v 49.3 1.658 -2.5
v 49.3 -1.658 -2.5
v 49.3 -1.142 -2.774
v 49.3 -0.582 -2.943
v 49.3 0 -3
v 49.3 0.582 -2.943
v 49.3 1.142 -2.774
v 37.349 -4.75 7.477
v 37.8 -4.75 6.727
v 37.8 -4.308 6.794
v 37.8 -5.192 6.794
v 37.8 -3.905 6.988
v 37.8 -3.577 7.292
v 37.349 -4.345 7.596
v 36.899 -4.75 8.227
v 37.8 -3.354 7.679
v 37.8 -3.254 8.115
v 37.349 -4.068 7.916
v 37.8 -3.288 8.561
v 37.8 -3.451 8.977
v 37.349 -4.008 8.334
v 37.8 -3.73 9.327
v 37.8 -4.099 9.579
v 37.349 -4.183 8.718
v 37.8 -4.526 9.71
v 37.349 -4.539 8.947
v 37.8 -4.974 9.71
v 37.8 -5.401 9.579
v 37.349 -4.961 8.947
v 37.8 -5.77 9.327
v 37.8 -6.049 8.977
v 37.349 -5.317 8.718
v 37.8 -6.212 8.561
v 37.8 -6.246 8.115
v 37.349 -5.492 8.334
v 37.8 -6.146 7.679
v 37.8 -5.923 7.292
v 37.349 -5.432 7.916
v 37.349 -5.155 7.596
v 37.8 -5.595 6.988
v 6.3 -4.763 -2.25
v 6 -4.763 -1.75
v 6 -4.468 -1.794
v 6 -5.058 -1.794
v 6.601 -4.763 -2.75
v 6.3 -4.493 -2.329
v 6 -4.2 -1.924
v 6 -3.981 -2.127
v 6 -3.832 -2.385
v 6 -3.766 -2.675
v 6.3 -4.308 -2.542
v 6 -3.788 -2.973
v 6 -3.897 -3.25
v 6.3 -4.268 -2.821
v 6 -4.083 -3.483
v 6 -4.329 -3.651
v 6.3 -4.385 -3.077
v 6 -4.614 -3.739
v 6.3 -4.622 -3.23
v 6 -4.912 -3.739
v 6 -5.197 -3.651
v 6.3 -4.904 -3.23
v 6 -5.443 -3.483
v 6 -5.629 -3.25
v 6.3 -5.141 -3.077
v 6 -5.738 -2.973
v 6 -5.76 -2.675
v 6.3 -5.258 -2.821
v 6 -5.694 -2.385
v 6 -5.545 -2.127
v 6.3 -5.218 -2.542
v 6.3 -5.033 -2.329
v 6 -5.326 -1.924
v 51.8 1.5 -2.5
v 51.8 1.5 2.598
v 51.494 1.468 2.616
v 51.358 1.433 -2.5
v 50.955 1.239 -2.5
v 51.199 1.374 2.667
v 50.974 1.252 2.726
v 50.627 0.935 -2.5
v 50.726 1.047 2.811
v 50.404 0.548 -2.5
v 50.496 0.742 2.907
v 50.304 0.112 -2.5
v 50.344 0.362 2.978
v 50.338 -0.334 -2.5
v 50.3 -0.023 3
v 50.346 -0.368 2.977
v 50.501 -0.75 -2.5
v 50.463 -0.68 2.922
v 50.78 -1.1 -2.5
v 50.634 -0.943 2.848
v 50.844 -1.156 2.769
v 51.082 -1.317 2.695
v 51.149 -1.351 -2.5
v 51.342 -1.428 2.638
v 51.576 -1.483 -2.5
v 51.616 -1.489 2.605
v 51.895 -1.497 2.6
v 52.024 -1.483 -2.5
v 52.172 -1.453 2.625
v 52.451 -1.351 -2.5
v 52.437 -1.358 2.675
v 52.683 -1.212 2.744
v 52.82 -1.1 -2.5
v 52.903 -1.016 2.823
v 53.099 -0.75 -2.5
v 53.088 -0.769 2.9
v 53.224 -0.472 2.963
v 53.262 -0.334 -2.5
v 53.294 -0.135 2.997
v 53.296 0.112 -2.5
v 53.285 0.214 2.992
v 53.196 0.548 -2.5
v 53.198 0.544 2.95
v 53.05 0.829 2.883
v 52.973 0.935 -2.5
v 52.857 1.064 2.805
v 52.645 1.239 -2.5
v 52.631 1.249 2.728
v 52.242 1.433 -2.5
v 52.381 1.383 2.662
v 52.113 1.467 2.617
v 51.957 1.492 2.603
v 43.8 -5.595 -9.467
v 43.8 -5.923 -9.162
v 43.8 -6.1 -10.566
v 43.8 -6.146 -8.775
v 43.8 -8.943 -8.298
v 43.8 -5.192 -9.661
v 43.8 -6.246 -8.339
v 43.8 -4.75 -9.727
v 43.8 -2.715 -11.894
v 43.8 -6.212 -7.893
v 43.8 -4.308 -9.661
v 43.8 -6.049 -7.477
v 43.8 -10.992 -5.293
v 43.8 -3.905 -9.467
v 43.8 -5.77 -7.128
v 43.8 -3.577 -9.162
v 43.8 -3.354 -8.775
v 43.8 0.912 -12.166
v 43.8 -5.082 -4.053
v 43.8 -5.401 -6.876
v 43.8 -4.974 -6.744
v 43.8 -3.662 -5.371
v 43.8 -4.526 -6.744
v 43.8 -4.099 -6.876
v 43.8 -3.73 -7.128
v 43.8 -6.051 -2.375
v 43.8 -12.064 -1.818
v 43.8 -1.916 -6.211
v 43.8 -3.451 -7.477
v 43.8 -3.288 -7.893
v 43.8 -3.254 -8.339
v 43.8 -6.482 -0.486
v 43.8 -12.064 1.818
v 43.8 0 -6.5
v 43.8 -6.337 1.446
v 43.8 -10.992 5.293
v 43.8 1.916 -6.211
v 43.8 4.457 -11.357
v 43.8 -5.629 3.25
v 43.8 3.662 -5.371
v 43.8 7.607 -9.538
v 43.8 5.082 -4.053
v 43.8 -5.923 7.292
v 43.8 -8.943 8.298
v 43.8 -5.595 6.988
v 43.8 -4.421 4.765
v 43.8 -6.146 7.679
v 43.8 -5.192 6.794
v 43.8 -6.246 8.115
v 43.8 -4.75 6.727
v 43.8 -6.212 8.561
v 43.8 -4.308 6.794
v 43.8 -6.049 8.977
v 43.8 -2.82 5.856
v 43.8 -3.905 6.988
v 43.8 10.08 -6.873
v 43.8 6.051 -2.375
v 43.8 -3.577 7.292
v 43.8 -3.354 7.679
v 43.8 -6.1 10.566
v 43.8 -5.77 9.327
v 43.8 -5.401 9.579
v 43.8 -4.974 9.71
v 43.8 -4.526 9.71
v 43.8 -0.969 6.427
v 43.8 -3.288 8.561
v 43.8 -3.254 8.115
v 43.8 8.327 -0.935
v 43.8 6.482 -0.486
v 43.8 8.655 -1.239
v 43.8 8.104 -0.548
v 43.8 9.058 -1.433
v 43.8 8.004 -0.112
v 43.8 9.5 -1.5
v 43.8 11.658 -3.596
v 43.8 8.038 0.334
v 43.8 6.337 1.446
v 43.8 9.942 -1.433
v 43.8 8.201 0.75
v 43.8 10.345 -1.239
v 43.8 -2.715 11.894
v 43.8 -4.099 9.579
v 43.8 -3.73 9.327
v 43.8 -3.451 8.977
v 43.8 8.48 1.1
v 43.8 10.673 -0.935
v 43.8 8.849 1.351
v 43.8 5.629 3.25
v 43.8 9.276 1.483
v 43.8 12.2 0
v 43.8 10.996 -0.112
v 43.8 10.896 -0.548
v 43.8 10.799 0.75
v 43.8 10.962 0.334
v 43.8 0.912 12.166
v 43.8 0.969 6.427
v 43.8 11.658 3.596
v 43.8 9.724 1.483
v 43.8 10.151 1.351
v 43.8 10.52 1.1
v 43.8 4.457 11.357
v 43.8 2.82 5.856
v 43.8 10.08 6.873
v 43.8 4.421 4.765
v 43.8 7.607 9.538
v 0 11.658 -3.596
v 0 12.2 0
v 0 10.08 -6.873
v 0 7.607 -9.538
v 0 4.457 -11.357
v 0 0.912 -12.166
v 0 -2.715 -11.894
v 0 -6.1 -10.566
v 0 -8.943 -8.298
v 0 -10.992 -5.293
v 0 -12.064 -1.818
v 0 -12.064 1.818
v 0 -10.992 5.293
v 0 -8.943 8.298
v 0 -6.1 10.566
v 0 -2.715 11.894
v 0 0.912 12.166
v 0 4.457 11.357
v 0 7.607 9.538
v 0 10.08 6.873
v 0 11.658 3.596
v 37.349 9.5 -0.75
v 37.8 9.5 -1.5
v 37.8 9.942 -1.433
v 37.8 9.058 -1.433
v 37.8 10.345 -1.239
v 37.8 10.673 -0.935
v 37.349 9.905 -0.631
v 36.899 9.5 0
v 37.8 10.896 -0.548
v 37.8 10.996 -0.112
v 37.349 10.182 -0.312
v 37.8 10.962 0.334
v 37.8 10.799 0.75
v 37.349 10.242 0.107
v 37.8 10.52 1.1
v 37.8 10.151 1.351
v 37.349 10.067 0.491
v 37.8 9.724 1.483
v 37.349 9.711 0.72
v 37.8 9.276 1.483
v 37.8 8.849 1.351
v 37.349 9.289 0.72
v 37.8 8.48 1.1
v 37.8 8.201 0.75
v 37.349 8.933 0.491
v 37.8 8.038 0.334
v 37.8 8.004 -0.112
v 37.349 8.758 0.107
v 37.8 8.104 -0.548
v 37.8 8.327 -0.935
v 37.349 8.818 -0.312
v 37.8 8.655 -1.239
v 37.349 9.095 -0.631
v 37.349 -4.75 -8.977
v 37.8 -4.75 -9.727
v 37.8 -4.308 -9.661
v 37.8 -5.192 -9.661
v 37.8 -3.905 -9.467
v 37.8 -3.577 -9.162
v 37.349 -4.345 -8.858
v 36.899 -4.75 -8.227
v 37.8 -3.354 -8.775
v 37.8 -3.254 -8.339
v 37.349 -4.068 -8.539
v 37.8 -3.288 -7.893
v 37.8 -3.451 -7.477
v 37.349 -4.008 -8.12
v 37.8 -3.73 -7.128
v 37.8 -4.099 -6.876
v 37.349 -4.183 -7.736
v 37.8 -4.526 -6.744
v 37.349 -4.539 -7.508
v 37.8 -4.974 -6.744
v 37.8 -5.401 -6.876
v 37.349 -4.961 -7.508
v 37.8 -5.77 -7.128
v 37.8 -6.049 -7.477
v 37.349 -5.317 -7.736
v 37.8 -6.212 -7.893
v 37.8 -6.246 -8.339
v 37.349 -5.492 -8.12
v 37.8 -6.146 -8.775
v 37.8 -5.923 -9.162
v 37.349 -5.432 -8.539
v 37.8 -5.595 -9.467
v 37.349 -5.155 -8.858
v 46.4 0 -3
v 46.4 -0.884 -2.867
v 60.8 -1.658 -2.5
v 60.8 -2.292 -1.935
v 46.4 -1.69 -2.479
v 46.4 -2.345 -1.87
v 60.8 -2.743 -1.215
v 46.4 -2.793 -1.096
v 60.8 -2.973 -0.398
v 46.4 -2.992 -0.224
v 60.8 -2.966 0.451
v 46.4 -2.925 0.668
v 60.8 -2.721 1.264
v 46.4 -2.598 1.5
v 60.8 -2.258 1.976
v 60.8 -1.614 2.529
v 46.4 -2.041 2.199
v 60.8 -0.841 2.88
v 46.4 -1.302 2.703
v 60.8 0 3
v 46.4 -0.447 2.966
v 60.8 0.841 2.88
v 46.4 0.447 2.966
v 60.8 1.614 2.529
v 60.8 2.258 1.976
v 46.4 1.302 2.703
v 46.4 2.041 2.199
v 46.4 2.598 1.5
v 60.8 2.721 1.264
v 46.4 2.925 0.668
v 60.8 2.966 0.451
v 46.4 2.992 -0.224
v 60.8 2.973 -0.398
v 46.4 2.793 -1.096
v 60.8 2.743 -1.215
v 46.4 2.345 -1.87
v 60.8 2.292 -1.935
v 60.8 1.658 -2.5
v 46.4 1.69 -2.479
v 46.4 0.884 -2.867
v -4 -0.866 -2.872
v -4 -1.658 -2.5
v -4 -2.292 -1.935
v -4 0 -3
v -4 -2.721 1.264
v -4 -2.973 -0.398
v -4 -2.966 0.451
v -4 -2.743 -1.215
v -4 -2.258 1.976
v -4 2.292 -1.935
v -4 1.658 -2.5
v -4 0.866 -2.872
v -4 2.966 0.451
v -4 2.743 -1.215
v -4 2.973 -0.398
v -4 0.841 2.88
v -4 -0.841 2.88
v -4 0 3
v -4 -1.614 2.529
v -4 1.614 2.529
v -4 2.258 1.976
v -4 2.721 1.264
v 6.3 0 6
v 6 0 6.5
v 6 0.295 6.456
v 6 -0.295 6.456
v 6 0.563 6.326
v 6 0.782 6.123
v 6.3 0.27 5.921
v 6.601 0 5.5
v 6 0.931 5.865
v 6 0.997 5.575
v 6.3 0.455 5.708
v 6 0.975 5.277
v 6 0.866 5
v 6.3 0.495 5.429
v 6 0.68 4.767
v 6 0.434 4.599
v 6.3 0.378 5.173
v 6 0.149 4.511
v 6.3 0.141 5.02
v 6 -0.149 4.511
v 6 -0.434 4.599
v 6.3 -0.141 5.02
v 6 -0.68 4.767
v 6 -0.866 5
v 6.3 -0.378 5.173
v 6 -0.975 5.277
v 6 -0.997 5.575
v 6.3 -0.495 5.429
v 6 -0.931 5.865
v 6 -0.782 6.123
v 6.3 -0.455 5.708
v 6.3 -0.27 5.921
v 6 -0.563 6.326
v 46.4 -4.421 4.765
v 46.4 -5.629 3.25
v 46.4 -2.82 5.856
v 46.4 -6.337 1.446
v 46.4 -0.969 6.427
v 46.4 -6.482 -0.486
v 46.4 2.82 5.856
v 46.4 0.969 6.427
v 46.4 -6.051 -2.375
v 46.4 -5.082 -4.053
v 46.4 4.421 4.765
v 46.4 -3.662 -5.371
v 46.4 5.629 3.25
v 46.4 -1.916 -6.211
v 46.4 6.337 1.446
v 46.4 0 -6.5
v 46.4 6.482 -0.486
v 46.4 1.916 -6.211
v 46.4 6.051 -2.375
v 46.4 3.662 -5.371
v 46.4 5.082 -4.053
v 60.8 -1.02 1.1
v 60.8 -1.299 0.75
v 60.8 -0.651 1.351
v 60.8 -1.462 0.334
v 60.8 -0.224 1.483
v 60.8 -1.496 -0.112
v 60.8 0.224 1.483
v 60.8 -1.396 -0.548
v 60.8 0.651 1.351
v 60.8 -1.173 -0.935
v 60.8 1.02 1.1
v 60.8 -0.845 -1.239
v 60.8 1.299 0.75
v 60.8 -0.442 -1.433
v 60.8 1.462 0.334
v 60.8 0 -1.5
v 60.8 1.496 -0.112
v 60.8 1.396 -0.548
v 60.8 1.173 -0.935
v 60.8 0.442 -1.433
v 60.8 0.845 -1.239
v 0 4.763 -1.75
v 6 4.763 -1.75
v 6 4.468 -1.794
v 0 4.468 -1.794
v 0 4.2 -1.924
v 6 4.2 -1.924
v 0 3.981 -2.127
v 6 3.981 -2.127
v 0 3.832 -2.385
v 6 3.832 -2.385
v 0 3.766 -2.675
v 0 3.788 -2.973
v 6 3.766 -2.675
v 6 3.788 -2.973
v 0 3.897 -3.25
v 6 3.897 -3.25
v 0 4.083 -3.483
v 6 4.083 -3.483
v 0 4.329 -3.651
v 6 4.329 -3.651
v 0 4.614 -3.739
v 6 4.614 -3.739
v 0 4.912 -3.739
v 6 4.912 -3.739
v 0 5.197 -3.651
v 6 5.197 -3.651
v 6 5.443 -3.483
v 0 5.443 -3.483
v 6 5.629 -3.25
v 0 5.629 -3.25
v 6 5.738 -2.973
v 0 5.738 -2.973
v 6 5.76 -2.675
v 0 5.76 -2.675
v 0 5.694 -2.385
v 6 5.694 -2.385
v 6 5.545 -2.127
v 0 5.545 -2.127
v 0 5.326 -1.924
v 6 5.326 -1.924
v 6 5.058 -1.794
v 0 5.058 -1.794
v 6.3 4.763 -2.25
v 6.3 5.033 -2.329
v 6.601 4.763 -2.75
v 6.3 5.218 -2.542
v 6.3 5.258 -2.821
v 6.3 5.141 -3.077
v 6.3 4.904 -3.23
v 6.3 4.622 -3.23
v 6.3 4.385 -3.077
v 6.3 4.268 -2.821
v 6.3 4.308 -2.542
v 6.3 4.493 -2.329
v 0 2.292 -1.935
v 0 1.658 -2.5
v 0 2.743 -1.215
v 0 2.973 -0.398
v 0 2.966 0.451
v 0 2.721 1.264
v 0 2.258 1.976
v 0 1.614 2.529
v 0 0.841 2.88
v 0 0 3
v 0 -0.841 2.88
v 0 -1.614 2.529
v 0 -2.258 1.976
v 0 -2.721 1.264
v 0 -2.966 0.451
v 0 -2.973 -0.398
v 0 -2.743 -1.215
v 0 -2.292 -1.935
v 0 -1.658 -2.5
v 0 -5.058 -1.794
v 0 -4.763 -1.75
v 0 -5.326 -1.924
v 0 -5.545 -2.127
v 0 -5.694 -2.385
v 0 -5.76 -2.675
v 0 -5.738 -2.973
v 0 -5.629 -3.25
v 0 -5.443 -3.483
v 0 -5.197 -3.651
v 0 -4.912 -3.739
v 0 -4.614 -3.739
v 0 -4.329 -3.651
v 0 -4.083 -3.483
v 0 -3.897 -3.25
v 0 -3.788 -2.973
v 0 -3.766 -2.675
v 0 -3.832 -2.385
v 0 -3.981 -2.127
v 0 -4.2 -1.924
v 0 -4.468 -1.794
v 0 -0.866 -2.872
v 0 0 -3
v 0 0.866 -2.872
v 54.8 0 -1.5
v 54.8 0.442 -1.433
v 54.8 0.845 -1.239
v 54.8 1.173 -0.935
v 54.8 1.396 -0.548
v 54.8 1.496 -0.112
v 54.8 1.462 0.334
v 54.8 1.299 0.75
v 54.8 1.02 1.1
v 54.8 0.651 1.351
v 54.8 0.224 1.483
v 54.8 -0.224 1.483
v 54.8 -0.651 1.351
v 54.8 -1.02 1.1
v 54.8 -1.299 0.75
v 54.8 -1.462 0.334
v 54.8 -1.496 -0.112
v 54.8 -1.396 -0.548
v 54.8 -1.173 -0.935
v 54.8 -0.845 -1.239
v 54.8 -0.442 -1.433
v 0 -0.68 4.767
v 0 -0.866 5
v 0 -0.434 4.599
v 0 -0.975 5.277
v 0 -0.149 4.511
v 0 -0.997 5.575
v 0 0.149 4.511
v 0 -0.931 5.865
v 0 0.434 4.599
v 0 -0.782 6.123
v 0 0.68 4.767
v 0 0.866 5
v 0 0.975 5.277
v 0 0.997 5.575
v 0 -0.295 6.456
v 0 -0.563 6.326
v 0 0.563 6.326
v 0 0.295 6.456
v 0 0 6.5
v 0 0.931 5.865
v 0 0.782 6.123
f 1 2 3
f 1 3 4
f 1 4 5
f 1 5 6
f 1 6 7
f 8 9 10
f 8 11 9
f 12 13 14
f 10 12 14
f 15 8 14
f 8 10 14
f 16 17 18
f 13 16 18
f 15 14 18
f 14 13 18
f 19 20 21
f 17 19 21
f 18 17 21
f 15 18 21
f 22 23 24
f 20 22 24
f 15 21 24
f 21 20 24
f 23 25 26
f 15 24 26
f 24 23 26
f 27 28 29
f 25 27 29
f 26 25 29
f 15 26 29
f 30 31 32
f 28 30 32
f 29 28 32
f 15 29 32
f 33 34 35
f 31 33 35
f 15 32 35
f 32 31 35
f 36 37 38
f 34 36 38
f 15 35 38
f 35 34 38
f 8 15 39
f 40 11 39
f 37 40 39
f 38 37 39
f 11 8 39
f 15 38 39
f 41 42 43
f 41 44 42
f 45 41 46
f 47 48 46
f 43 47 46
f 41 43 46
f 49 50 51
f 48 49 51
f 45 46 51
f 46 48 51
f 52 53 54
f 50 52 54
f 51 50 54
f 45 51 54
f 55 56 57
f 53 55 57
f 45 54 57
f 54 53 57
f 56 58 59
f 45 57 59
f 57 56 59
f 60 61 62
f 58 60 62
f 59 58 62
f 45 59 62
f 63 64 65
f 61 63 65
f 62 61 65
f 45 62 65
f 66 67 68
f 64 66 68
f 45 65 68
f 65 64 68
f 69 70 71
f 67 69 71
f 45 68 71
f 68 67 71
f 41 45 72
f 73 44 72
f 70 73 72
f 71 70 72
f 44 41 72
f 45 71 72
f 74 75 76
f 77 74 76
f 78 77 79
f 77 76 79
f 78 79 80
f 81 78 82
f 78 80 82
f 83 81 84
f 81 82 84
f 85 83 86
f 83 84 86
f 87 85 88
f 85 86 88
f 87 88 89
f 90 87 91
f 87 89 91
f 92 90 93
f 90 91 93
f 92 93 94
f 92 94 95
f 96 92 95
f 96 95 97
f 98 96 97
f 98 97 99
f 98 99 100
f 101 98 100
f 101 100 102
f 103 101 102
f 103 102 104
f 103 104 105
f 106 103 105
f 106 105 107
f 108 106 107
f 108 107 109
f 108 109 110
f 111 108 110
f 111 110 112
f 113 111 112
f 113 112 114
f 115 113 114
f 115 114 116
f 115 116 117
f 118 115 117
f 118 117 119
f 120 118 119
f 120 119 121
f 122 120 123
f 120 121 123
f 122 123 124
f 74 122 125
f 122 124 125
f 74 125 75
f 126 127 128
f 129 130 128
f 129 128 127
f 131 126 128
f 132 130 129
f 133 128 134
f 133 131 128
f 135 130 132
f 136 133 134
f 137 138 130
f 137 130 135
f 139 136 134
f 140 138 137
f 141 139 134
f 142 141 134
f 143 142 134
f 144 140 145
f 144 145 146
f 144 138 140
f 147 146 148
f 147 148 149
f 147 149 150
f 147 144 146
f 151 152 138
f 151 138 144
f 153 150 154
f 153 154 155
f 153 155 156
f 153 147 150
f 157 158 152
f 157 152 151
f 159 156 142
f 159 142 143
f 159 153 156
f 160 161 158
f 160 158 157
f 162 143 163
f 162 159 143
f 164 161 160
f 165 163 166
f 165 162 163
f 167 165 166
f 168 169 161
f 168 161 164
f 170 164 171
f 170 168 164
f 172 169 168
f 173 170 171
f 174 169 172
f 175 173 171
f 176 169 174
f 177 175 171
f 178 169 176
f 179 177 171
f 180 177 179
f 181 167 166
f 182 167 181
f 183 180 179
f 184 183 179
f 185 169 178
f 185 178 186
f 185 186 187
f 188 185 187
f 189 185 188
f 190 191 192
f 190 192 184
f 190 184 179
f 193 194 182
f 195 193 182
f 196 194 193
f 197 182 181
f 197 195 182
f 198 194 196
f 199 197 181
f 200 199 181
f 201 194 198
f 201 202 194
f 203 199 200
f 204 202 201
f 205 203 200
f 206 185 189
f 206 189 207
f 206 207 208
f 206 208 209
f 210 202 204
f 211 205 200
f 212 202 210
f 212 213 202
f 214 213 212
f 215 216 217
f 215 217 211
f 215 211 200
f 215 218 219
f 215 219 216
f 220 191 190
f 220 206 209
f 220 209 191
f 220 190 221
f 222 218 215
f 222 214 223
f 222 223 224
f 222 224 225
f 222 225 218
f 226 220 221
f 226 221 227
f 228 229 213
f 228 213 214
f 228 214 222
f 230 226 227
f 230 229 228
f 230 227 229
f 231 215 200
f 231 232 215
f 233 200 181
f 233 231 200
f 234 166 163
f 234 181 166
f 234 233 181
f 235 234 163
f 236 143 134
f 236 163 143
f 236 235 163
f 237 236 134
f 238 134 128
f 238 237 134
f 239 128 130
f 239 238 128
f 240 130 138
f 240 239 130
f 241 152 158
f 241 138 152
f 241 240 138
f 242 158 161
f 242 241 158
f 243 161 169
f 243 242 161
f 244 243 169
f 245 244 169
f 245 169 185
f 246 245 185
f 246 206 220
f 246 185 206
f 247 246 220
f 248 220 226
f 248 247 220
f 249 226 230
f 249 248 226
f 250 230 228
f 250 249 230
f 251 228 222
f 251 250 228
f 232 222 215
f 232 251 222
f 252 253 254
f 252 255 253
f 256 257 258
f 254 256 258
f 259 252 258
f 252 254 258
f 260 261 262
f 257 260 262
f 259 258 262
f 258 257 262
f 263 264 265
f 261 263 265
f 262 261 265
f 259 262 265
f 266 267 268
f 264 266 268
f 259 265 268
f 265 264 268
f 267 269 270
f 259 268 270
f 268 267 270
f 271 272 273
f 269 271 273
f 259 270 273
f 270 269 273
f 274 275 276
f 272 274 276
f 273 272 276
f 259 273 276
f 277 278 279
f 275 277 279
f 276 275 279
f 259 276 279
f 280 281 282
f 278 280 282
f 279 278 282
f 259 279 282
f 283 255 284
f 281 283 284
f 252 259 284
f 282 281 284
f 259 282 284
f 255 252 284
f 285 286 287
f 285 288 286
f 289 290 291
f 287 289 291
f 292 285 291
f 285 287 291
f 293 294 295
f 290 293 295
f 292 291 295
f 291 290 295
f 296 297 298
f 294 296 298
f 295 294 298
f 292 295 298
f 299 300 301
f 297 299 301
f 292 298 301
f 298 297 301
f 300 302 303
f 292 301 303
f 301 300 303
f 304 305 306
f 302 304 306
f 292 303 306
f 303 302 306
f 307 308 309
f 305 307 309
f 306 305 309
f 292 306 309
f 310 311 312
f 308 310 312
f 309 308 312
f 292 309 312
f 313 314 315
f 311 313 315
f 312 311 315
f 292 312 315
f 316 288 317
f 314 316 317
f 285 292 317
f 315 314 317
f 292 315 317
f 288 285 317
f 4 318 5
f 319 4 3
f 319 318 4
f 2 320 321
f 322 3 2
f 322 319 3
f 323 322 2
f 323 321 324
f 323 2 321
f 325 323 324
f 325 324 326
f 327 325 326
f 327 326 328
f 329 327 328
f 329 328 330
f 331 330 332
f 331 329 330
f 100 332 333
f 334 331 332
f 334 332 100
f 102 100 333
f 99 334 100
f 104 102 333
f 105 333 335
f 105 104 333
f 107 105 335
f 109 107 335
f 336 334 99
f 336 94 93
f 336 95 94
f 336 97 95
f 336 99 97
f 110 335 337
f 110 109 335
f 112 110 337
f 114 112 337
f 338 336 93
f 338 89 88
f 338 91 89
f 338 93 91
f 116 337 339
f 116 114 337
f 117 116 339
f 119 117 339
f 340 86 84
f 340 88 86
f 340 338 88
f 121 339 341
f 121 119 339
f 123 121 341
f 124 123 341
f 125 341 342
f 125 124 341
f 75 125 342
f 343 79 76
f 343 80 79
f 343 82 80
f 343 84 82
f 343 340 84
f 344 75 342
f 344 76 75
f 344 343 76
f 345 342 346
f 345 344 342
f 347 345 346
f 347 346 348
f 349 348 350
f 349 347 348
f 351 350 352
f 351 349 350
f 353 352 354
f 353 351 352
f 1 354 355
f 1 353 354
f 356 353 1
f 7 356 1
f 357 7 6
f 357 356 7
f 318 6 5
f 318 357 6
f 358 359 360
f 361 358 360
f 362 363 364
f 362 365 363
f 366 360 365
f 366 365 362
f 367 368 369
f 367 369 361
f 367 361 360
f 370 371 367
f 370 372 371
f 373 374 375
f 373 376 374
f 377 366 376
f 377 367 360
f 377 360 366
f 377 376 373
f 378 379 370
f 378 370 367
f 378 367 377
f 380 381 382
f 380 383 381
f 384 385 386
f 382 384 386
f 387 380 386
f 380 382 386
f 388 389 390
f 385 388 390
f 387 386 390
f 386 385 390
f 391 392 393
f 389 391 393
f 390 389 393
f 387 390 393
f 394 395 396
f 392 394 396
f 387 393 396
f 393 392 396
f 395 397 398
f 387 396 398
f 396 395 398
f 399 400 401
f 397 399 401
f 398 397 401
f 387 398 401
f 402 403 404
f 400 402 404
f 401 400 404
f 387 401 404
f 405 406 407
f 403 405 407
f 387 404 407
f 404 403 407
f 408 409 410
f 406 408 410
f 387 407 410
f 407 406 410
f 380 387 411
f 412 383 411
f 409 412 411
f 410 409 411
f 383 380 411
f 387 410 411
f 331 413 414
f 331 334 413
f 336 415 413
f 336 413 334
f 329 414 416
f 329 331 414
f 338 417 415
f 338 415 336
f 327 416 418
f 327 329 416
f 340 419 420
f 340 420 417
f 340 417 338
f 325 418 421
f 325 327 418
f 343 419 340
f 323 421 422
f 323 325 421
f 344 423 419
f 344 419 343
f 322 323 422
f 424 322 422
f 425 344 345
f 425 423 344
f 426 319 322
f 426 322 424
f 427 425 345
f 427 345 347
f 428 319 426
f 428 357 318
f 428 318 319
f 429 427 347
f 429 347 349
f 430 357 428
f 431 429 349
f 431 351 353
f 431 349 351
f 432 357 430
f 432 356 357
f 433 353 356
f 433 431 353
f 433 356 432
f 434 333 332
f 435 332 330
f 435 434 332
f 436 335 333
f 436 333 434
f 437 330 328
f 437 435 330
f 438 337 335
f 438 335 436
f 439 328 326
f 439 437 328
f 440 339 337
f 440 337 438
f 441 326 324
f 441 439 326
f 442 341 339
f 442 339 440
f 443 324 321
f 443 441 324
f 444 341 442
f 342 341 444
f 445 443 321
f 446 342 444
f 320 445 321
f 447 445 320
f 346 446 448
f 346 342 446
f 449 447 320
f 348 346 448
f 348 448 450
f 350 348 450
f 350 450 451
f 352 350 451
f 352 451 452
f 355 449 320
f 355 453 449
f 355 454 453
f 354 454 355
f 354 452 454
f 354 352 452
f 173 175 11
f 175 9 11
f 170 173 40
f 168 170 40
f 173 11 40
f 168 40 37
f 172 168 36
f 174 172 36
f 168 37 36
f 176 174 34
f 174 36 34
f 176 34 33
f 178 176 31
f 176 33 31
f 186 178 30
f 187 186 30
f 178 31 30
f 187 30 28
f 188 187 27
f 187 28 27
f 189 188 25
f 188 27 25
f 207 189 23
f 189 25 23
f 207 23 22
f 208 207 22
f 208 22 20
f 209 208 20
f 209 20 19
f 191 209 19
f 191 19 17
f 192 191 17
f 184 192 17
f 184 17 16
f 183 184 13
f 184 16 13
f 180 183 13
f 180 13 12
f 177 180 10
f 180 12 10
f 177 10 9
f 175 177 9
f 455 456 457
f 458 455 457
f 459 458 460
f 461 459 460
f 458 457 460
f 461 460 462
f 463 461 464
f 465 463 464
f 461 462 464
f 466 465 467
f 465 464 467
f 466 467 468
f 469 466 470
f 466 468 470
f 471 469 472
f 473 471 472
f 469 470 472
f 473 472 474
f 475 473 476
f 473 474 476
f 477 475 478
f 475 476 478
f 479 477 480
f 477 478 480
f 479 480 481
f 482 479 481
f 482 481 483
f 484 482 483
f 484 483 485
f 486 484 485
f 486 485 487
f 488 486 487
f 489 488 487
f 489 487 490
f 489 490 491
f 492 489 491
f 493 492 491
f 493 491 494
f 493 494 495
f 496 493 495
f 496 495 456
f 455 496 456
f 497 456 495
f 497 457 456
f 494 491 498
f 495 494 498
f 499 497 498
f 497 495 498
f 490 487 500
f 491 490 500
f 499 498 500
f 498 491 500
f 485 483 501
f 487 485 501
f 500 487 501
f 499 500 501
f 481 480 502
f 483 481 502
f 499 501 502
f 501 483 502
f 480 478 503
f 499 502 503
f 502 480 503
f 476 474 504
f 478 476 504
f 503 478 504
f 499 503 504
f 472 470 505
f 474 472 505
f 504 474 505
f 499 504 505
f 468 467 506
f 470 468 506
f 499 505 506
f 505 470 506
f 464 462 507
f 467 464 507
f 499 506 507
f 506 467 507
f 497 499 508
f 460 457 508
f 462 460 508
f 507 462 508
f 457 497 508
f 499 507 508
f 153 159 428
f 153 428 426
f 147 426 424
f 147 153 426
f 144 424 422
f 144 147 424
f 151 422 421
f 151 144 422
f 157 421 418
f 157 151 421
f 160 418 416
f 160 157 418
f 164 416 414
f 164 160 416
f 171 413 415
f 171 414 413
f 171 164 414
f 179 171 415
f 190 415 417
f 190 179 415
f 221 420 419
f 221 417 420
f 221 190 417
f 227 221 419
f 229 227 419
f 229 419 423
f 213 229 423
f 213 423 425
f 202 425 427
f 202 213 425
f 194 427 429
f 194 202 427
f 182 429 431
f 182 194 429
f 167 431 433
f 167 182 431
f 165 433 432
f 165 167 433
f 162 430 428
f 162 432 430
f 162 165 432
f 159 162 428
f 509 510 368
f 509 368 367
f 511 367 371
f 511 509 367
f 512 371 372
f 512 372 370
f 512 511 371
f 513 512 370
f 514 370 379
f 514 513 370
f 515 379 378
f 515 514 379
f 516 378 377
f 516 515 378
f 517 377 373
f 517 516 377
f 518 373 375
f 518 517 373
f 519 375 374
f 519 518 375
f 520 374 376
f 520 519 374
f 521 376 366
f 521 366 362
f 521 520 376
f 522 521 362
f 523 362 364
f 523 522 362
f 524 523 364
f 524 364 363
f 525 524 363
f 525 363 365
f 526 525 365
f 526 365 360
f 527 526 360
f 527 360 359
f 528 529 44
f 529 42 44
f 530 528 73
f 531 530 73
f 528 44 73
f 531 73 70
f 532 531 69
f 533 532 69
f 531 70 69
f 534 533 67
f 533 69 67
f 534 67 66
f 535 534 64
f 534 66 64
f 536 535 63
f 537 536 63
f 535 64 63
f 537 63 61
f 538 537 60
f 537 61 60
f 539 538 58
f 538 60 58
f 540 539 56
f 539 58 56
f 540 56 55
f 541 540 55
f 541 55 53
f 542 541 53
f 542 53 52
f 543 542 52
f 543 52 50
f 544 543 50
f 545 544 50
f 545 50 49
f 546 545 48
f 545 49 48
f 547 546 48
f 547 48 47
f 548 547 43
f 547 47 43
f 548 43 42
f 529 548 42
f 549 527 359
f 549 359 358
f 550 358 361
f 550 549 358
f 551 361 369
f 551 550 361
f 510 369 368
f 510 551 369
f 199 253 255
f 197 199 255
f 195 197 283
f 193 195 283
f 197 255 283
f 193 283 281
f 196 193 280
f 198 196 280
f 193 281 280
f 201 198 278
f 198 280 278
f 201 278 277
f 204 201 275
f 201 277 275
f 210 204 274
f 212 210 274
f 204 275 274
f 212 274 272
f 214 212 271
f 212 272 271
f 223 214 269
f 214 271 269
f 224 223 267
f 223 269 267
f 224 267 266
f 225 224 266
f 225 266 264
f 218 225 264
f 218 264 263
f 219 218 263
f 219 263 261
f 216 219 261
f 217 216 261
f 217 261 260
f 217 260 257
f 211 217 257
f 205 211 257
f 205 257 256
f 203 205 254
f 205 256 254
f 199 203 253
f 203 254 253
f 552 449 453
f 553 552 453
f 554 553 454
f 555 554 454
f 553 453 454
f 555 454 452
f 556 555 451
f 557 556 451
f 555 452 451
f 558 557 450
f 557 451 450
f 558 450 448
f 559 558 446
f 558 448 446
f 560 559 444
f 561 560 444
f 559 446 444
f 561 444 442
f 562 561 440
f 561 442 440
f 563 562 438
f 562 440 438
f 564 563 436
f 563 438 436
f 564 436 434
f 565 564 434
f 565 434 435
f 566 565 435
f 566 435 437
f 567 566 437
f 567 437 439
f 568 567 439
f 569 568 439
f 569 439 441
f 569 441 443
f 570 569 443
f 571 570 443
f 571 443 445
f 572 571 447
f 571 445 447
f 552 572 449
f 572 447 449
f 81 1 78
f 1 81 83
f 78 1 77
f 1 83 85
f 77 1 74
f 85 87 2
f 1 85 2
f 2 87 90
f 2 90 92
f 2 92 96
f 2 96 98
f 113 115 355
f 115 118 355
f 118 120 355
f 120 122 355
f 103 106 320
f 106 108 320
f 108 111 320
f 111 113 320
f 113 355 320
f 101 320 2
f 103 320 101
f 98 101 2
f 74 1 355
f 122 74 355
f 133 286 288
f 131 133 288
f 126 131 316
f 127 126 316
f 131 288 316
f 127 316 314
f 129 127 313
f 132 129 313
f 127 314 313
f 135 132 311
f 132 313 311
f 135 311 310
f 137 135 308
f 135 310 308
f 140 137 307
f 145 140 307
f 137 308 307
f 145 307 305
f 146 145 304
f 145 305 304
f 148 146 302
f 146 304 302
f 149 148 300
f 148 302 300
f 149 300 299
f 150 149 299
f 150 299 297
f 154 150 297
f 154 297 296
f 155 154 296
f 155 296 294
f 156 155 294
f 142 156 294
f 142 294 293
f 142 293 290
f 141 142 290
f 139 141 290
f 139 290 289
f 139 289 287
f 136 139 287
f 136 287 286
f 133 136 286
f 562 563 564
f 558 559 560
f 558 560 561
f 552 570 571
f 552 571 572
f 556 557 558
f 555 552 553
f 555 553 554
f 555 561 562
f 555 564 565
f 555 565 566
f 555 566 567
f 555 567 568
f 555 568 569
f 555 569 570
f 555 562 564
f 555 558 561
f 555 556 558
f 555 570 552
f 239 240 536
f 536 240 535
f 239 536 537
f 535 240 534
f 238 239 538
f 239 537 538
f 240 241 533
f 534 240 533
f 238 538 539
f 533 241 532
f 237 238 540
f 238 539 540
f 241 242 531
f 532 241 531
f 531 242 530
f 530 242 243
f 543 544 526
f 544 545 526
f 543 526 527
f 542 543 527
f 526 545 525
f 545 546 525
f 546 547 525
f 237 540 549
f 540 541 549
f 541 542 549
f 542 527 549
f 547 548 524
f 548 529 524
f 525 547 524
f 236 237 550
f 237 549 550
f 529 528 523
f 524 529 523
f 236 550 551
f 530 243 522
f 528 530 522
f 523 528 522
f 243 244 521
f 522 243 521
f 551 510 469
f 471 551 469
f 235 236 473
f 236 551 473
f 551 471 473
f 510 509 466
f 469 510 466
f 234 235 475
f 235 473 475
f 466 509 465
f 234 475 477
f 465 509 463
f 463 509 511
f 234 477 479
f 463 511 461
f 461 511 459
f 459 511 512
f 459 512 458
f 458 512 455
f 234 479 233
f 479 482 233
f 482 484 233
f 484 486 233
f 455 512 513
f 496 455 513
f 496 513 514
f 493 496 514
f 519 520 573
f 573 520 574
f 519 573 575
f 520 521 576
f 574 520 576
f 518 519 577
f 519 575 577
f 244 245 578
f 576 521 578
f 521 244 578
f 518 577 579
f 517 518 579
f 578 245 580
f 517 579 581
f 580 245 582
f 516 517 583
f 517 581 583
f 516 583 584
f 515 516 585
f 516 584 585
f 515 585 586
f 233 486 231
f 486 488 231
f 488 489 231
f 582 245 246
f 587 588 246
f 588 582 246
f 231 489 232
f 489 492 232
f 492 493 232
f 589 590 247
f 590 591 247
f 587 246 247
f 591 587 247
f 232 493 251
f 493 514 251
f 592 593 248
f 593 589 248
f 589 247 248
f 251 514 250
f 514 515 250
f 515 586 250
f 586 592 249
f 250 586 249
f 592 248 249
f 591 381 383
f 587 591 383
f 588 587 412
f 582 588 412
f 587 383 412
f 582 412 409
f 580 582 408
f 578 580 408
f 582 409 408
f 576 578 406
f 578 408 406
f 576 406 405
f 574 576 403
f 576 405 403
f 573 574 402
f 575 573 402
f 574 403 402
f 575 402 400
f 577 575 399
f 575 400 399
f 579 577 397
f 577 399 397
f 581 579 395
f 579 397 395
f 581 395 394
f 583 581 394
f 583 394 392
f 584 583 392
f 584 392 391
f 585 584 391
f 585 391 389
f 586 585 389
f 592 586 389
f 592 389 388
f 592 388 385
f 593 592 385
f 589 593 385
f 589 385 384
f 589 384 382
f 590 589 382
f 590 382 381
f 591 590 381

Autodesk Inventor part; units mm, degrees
ref_plane "YZ Plane" through (0, 0, 0) normal (1, 0, 0) x (0, 1, 0)
ref_plane "XZ Plane" through (0, 0, 0) normal (0, 1, 0) x (-1, 0, 0)
ref_plane "XY Plane" through (0, 0, 0) normal (0, 0, 1) x (1, 0, 0)
sketch "スケッチ1" plane through (0, 0, 0) normal (1, 0, 0) x (0, 1, 0)
  circle A0 centre (0, 0) radius 12.2
  dimension "d0" = 24.4
extrude "押し出し1" add sketch "スケッチ1" along normal blind 43.8
sketch "スケッチ2" plane through (43.8, 0, 0) normal (1, 0, 0) x (0, 0, -1)
  circle A0 centre (0, 0) radius 6.5
  dimension "d3" = 13
extrude "押し出し2" add sketch "スケッチ2" along normal blind 2.6
sketch "スケッチ3" plane through (46.4, 0, 0) normal (1, 0, 0) x (0, 0, -1)
  circle A0 centre (0, 0) radius 3
  dimension "d6" = 6
extrude "押し出し3" add sketch "スケッチ3" along normal blind 14.4
sketch "スケッチ4" plane through (60.8, 0, 0) normal (1, 0, 0) x (0, 0, -1)
  circle A0 centre (0, 0) radius 3 projected
  line L0 (2.5, 1.6583) -> (2.5, -1.6583)
  line L1 (0, 0) -> (0, -3)
  dimension "d9" = 6
  dimension "d10" = 2.5
extrude "押し出し4" cut sketch "スケッチ4" against normal blind 11.5 contours A0 L0 picked at (2.5914, -0.3806)
sketch "スケッチ5" plane through (60.8, -1.6583, -2.5) normal (0, 0, -1) x (-1, 0, 0)
  line L0 (0, 0) -> (0, 3.3166) projected
  point P0 (60.8, 1.6583)
  point P1 (9, 1.6583)
  point P2 (0, 1.6583)
  dimension "d13" = 0
  dimension "d14" = 9
hole "穴1" at (51.8, 0, -2.5) direction (0, 0, 1) diameter 3 end through all
sketch "スケッチ6" plane through (0, 0, 0) normal (-1, 0, 0) x (0, 0, 1)
  arc A0 (-2.5, -1.6583) -> (-2.5, 1.6583) centre (0, 0) ccw projected
  circle A1 centre (0, 0) radius 3
  point P0 (-2.5, 1.6583)
  dimension "d22" = 6
extrude "押し出し5" add sketch "スケッチ6" along normal blind 4
sketch "スケッチ7" plane through (60.8, 0, 0) normal (1, 0, 0) x (0, 0, -1)
  circle A0 centre (0, 0) radius 6.5 projected
  circle A1 centre (0, 0) radius 1.5
  dimension "d25" = 3
extrude "押し出し6" cut sketch "スケッチ7" against normal blind 6 contours A1
sketch "スケッチ8" plane through (43.8, 0, 0) normal (1, 0, 0) x (0, 0, -1)
  point P0 (0, 0)
  point P1 (0, 9.5)
  point P2 (-8.2272, -4.75)
  point P3 (8.2272, -4.75)
  dimension "d28" = 0
  dimension "d29" = 9.5
  dimension "d32" = 360
hole "穴2" at (43.8, 9.5, 0) at (43.8, -4.75, 8.2272) at (43.8, -4.75, -8.2272) direction (-1, 0, 0) diameter 3 depth 6 tip angle 118
sketch "スケッチ9" plane through (0, 0, 0) normal (-1, 0, 0) x (0, 0, 1)
  point P0 (0, 0)
  point P1 (5.5, 0)
  point P2 (-2.75, 4.7631)
  point P3 (-2.75, -4.7631)
  dimension "d41" = 0
  dimension "d42" = 5.5
  dimension "d45" = 360
hole "穴3" at (0, 0, 5.5) at (0, 4.7631, -2.75) at (0, -4.7631, -2.75) direction (1, 0, 0) diameter 2 depth 6 tip angle 118
properties part number "M2006 P36" material "ステンレス鋼"
